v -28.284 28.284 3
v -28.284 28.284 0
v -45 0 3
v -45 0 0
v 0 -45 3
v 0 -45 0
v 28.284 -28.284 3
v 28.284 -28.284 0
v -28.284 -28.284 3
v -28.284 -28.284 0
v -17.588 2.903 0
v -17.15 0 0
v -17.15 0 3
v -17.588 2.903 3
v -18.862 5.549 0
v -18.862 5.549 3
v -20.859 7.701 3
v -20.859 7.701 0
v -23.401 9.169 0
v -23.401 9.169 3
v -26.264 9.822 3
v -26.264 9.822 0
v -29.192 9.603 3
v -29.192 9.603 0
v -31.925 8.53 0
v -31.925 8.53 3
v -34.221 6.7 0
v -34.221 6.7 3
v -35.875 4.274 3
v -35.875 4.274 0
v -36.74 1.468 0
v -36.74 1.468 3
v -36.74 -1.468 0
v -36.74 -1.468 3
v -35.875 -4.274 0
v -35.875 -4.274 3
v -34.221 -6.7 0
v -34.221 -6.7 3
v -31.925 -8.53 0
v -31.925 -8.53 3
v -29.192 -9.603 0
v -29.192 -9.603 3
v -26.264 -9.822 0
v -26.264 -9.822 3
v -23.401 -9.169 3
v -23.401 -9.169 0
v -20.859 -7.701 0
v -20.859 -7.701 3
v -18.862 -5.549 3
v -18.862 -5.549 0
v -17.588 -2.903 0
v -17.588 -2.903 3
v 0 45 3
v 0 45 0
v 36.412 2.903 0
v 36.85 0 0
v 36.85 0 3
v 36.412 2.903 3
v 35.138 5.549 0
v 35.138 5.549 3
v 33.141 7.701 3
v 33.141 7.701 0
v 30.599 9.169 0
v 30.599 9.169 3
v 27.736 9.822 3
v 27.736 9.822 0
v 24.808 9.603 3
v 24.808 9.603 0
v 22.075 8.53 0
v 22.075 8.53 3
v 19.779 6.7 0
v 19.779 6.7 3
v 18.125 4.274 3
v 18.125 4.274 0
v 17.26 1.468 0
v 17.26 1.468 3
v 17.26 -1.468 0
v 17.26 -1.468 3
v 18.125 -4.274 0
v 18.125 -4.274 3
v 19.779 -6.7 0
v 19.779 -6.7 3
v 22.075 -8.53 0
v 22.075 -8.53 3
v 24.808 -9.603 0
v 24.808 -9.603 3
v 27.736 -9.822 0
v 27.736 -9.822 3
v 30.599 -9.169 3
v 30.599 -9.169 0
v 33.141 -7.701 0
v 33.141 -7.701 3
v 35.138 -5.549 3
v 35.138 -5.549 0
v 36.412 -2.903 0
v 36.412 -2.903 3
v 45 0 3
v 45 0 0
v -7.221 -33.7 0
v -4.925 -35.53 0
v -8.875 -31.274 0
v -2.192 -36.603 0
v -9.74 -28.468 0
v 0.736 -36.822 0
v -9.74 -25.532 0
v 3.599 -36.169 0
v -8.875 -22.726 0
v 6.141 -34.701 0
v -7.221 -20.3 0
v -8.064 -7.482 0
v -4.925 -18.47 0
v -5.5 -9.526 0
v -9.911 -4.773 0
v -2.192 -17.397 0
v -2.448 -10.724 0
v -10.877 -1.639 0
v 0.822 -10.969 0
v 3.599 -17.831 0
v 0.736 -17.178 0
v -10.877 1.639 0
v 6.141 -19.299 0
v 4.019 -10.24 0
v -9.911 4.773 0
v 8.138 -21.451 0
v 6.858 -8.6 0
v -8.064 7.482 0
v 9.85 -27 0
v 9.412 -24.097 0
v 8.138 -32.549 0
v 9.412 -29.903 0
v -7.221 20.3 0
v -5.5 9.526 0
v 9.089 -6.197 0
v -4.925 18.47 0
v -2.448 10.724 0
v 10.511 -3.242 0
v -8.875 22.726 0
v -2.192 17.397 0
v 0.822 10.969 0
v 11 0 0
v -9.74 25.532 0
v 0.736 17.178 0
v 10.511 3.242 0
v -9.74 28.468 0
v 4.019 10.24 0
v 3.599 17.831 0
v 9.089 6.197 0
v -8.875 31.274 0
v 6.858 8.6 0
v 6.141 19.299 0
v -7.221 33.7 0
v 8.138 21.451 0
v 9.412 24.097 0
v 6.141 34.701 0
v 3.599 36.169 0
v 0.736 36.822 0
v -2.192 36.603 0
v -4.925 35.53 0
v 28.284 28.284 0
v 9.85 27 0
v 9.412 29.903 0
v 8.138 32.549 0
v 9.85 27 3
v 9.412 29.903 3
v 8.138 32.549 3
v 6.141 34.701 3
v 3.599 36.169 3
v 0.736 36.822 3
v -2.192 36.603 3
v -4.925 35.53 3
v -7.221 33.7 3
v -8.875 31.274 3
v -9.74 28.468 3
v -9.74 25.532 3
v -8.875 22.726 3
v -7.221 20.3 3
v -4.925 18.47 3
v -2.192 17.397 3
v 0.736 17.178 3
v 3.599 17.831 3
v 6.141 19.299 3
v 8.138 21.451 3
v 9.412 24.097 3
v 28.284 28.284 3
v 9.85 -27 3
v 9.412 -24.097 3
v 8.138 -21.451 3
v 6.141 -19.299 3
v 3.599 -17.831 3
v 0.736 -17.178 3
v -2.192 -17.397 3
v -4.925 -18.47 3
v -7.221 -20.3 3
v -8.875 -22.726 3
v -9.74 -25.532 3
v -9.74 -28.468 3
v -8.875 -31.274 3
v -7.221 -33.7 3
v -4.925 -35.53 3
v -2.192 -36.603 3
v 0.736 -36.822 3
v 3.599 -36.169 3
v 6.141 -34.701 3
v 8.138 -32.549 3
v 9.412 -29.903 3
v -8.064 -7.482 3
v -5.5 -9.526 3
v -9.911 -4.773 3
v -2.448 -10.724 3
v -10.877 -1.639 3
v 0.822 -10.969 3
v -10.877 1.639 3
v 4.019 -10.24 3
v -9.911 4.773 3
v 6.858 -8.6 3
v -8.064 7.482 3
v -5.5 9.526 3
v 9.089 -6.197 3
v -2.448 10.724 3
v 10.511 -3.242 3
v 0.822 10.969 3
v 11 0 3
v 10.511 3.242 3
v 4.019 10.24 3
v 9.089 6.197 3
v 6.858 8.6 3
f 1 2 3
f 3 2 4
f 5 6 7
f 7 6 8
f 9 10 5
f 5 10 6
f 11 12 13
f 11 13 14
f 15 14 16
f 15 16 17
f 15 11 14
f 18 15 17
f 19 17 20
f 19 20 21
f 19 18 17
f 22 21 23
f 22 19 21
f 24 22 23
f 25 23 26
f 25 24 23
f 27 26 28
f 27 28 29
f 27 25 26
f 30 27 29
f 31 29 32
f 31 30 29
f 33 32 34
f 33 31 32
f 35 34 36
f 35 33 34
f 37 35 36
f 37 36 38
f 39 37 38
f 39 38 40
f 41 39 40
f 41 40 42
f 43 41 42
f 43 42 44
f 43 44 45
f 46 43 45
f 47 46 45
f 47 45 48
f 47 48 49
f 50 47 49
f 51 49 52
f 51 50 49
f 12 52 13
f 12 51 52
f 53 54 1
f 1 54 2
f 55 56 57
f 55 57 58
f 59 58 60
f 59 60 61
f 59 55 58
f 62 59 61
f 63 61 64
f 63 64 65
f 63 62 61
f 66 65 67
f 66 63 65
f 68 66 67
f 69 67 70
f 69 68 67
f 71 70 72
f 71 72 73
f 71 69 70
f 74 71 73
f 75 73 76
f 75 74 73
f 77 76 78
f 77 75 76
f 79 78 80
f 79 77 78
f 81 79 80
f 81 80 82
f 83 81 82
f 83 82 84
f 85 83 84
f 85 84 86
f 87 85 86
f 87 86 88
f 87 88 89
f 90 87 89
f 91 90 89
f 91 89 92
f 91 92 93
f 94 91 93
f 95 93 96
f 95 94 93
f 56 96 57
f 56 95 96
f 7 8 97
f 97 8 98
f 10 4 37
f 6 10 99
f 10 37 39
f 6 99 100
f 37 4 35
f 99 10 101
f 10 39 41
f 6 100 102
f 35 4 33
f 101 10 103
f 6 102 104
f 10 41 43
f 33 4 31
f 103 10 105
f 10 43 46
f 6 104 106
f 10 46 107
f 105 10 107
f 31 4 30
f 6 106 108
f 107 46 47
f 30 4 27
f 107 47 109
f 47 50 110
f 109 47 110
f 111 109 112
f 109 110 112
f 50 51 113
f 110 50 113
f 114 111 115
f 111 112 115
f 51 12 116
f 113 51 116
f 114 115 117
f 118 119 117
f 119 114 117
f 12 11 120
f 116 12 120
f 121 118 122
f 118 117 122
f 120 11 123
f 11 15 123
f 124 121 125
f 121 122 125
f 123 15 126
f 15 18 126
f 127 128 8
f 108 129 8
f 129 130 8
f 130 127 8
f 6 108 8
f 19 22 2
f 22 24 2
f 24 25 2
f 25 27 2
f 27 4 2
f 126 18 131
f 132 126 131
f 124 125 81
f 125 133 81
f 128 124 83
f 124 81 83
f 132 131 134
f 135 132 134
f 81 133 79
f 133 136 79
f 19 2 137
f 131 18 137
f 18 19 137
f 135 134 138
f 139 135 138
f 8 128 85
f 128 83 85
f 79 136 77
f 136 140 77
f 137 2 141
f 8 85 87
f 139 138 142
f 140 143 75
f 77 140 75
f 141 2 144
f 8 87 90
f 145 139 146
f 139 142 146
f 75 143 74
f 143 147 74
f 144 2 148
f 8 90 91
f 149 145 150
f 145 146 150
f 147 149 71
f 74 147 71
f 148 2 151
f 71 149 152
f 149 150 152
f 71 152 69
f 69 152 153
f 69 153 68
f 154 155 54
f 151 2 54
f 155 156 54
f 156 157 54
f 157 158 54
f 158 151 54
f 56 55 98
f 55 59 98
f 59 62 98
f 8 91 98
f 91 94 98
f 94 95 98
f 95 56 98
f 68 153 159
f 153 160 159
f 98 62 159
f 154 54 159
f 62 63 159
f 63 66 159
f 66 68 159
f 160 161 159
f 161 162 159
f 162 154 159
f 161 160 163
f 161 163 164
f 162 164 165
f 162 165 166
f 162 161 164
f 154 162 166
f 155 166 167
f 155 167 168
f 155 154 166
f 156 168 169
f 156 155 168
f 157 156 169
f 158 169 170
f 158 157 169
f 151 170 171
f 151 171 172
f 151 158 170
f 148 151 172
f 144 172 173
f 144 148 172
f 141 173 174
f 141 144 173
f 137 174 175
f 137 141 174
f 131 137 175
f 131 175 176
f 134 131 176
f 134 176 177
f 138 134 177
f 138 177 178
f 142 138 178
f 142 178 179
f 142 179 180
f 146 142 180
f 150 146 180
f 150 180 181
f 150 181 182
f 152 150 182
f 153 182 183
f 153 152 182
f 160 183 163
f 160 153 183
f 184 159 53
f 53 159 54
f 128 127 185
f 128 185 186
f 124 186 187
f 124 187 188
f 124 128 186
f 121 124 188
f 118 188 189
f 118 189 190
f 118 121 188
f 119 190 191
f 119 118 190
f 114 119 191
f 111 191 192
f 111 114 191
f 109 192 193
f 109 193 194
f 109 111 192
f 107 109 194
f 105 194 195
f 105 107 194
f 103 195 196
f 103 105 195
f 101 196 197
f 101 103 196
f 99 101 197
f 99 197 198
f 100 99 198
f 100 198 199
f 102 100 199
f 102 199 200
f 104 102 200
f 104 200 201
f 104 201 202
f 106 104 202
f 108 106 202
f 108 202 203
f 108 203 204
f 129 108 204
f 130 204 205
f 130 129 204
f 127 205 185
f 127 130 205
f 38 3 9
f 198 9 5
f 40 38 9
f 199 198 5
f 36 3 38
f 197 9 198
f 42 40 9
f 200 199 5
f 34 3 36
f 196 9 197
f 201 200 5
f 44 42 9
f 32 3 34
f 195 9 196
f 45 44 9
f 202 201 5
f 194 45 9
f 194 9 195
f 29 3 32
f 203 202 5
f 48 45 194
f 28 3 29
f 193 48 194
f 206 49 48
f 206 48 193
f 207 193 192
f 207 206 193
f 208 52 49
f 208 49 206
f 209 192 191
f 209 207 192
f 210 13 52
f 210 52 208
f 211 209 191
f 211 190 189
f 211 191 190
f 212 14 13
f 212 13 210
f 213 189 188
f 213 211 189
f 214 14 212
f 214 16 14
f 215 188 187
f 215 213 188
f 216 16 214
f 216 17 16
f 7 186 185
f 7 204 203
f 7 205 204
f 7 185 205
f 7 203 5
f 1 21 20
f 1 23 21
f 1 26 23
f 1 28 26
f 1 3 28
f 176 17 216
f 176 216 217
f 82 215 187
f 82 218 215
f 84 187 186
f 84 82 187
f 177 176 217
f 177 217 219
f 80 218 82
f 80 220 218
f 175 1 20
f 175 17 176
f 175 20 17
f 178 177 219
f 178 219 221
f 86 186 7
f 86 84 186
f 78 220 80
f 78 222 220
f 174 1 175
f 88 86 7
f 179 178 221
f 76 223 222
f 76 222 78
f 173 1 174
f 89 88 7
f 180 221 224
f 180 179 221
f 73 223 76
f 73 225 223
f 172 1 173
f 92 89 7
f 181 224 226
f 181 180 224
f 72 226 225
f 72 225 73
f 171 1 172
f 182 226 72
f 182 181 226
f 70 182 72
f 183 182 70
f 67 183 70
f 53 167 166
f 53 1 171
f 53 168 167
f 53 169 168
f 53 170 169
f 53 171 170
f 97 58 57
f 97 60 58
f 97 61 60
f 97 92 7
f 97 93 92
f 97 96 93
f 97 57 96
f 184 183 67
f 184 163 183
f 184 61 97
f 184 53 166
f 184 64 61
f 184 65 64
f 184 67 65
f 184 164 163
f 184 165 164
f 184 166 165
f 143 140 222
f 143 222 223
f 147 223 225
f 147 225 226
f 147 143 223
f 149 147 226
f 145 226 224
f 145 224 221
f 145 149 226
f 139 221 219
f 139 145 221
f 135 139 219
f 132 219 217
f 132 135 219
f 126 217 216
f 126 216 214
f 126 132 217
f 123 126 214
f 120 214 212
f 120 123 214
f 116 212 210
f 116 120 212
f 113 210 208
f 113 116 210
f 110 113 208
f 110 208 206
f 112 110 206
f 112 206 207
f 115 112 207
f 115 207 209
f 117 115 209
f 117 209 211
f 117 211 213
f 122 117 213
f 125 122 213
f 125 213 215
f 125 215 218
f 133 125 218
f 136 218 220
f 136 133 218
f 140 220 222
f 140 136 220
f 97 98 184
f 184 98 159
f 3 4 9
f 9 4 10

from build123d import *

# Parameters (mm, degrees)
F0_R     = 9.85
F0_R_2   = 11
F1_DEPTH = 3


with BuildPart() as f1:
    # F0 (on Top) → F1 (new body)
    with BuildSketch(Plane.XY):
        Polygon((-28.284271, 28.284271), (-45, 0), (-28.284271, -28.284271), (0, -45), (28.284271, -28.284271), (45, 0), (28.284271, 28.284271), (0, 45), align=None)
        with Locations((0, -27)):
            Circle(F0_R, mode=Mode.SUBTRACT)
        with Locations((-27, 0)):
            Circle(F0_R, mode=Mode.SUBTRACT)
        Circle(F0_R_2, mode=Mode.SUBTRACT)
        with Locations((27, 0)):
            Circle(F0_R, mode=Mode.SUBTRACT)
        with Locations((0, 27)):
            Circle(F0_R, mode=Mode.SUBTRACT)
    extrude(amount=F1_DEPTH)


solid = f1.part
